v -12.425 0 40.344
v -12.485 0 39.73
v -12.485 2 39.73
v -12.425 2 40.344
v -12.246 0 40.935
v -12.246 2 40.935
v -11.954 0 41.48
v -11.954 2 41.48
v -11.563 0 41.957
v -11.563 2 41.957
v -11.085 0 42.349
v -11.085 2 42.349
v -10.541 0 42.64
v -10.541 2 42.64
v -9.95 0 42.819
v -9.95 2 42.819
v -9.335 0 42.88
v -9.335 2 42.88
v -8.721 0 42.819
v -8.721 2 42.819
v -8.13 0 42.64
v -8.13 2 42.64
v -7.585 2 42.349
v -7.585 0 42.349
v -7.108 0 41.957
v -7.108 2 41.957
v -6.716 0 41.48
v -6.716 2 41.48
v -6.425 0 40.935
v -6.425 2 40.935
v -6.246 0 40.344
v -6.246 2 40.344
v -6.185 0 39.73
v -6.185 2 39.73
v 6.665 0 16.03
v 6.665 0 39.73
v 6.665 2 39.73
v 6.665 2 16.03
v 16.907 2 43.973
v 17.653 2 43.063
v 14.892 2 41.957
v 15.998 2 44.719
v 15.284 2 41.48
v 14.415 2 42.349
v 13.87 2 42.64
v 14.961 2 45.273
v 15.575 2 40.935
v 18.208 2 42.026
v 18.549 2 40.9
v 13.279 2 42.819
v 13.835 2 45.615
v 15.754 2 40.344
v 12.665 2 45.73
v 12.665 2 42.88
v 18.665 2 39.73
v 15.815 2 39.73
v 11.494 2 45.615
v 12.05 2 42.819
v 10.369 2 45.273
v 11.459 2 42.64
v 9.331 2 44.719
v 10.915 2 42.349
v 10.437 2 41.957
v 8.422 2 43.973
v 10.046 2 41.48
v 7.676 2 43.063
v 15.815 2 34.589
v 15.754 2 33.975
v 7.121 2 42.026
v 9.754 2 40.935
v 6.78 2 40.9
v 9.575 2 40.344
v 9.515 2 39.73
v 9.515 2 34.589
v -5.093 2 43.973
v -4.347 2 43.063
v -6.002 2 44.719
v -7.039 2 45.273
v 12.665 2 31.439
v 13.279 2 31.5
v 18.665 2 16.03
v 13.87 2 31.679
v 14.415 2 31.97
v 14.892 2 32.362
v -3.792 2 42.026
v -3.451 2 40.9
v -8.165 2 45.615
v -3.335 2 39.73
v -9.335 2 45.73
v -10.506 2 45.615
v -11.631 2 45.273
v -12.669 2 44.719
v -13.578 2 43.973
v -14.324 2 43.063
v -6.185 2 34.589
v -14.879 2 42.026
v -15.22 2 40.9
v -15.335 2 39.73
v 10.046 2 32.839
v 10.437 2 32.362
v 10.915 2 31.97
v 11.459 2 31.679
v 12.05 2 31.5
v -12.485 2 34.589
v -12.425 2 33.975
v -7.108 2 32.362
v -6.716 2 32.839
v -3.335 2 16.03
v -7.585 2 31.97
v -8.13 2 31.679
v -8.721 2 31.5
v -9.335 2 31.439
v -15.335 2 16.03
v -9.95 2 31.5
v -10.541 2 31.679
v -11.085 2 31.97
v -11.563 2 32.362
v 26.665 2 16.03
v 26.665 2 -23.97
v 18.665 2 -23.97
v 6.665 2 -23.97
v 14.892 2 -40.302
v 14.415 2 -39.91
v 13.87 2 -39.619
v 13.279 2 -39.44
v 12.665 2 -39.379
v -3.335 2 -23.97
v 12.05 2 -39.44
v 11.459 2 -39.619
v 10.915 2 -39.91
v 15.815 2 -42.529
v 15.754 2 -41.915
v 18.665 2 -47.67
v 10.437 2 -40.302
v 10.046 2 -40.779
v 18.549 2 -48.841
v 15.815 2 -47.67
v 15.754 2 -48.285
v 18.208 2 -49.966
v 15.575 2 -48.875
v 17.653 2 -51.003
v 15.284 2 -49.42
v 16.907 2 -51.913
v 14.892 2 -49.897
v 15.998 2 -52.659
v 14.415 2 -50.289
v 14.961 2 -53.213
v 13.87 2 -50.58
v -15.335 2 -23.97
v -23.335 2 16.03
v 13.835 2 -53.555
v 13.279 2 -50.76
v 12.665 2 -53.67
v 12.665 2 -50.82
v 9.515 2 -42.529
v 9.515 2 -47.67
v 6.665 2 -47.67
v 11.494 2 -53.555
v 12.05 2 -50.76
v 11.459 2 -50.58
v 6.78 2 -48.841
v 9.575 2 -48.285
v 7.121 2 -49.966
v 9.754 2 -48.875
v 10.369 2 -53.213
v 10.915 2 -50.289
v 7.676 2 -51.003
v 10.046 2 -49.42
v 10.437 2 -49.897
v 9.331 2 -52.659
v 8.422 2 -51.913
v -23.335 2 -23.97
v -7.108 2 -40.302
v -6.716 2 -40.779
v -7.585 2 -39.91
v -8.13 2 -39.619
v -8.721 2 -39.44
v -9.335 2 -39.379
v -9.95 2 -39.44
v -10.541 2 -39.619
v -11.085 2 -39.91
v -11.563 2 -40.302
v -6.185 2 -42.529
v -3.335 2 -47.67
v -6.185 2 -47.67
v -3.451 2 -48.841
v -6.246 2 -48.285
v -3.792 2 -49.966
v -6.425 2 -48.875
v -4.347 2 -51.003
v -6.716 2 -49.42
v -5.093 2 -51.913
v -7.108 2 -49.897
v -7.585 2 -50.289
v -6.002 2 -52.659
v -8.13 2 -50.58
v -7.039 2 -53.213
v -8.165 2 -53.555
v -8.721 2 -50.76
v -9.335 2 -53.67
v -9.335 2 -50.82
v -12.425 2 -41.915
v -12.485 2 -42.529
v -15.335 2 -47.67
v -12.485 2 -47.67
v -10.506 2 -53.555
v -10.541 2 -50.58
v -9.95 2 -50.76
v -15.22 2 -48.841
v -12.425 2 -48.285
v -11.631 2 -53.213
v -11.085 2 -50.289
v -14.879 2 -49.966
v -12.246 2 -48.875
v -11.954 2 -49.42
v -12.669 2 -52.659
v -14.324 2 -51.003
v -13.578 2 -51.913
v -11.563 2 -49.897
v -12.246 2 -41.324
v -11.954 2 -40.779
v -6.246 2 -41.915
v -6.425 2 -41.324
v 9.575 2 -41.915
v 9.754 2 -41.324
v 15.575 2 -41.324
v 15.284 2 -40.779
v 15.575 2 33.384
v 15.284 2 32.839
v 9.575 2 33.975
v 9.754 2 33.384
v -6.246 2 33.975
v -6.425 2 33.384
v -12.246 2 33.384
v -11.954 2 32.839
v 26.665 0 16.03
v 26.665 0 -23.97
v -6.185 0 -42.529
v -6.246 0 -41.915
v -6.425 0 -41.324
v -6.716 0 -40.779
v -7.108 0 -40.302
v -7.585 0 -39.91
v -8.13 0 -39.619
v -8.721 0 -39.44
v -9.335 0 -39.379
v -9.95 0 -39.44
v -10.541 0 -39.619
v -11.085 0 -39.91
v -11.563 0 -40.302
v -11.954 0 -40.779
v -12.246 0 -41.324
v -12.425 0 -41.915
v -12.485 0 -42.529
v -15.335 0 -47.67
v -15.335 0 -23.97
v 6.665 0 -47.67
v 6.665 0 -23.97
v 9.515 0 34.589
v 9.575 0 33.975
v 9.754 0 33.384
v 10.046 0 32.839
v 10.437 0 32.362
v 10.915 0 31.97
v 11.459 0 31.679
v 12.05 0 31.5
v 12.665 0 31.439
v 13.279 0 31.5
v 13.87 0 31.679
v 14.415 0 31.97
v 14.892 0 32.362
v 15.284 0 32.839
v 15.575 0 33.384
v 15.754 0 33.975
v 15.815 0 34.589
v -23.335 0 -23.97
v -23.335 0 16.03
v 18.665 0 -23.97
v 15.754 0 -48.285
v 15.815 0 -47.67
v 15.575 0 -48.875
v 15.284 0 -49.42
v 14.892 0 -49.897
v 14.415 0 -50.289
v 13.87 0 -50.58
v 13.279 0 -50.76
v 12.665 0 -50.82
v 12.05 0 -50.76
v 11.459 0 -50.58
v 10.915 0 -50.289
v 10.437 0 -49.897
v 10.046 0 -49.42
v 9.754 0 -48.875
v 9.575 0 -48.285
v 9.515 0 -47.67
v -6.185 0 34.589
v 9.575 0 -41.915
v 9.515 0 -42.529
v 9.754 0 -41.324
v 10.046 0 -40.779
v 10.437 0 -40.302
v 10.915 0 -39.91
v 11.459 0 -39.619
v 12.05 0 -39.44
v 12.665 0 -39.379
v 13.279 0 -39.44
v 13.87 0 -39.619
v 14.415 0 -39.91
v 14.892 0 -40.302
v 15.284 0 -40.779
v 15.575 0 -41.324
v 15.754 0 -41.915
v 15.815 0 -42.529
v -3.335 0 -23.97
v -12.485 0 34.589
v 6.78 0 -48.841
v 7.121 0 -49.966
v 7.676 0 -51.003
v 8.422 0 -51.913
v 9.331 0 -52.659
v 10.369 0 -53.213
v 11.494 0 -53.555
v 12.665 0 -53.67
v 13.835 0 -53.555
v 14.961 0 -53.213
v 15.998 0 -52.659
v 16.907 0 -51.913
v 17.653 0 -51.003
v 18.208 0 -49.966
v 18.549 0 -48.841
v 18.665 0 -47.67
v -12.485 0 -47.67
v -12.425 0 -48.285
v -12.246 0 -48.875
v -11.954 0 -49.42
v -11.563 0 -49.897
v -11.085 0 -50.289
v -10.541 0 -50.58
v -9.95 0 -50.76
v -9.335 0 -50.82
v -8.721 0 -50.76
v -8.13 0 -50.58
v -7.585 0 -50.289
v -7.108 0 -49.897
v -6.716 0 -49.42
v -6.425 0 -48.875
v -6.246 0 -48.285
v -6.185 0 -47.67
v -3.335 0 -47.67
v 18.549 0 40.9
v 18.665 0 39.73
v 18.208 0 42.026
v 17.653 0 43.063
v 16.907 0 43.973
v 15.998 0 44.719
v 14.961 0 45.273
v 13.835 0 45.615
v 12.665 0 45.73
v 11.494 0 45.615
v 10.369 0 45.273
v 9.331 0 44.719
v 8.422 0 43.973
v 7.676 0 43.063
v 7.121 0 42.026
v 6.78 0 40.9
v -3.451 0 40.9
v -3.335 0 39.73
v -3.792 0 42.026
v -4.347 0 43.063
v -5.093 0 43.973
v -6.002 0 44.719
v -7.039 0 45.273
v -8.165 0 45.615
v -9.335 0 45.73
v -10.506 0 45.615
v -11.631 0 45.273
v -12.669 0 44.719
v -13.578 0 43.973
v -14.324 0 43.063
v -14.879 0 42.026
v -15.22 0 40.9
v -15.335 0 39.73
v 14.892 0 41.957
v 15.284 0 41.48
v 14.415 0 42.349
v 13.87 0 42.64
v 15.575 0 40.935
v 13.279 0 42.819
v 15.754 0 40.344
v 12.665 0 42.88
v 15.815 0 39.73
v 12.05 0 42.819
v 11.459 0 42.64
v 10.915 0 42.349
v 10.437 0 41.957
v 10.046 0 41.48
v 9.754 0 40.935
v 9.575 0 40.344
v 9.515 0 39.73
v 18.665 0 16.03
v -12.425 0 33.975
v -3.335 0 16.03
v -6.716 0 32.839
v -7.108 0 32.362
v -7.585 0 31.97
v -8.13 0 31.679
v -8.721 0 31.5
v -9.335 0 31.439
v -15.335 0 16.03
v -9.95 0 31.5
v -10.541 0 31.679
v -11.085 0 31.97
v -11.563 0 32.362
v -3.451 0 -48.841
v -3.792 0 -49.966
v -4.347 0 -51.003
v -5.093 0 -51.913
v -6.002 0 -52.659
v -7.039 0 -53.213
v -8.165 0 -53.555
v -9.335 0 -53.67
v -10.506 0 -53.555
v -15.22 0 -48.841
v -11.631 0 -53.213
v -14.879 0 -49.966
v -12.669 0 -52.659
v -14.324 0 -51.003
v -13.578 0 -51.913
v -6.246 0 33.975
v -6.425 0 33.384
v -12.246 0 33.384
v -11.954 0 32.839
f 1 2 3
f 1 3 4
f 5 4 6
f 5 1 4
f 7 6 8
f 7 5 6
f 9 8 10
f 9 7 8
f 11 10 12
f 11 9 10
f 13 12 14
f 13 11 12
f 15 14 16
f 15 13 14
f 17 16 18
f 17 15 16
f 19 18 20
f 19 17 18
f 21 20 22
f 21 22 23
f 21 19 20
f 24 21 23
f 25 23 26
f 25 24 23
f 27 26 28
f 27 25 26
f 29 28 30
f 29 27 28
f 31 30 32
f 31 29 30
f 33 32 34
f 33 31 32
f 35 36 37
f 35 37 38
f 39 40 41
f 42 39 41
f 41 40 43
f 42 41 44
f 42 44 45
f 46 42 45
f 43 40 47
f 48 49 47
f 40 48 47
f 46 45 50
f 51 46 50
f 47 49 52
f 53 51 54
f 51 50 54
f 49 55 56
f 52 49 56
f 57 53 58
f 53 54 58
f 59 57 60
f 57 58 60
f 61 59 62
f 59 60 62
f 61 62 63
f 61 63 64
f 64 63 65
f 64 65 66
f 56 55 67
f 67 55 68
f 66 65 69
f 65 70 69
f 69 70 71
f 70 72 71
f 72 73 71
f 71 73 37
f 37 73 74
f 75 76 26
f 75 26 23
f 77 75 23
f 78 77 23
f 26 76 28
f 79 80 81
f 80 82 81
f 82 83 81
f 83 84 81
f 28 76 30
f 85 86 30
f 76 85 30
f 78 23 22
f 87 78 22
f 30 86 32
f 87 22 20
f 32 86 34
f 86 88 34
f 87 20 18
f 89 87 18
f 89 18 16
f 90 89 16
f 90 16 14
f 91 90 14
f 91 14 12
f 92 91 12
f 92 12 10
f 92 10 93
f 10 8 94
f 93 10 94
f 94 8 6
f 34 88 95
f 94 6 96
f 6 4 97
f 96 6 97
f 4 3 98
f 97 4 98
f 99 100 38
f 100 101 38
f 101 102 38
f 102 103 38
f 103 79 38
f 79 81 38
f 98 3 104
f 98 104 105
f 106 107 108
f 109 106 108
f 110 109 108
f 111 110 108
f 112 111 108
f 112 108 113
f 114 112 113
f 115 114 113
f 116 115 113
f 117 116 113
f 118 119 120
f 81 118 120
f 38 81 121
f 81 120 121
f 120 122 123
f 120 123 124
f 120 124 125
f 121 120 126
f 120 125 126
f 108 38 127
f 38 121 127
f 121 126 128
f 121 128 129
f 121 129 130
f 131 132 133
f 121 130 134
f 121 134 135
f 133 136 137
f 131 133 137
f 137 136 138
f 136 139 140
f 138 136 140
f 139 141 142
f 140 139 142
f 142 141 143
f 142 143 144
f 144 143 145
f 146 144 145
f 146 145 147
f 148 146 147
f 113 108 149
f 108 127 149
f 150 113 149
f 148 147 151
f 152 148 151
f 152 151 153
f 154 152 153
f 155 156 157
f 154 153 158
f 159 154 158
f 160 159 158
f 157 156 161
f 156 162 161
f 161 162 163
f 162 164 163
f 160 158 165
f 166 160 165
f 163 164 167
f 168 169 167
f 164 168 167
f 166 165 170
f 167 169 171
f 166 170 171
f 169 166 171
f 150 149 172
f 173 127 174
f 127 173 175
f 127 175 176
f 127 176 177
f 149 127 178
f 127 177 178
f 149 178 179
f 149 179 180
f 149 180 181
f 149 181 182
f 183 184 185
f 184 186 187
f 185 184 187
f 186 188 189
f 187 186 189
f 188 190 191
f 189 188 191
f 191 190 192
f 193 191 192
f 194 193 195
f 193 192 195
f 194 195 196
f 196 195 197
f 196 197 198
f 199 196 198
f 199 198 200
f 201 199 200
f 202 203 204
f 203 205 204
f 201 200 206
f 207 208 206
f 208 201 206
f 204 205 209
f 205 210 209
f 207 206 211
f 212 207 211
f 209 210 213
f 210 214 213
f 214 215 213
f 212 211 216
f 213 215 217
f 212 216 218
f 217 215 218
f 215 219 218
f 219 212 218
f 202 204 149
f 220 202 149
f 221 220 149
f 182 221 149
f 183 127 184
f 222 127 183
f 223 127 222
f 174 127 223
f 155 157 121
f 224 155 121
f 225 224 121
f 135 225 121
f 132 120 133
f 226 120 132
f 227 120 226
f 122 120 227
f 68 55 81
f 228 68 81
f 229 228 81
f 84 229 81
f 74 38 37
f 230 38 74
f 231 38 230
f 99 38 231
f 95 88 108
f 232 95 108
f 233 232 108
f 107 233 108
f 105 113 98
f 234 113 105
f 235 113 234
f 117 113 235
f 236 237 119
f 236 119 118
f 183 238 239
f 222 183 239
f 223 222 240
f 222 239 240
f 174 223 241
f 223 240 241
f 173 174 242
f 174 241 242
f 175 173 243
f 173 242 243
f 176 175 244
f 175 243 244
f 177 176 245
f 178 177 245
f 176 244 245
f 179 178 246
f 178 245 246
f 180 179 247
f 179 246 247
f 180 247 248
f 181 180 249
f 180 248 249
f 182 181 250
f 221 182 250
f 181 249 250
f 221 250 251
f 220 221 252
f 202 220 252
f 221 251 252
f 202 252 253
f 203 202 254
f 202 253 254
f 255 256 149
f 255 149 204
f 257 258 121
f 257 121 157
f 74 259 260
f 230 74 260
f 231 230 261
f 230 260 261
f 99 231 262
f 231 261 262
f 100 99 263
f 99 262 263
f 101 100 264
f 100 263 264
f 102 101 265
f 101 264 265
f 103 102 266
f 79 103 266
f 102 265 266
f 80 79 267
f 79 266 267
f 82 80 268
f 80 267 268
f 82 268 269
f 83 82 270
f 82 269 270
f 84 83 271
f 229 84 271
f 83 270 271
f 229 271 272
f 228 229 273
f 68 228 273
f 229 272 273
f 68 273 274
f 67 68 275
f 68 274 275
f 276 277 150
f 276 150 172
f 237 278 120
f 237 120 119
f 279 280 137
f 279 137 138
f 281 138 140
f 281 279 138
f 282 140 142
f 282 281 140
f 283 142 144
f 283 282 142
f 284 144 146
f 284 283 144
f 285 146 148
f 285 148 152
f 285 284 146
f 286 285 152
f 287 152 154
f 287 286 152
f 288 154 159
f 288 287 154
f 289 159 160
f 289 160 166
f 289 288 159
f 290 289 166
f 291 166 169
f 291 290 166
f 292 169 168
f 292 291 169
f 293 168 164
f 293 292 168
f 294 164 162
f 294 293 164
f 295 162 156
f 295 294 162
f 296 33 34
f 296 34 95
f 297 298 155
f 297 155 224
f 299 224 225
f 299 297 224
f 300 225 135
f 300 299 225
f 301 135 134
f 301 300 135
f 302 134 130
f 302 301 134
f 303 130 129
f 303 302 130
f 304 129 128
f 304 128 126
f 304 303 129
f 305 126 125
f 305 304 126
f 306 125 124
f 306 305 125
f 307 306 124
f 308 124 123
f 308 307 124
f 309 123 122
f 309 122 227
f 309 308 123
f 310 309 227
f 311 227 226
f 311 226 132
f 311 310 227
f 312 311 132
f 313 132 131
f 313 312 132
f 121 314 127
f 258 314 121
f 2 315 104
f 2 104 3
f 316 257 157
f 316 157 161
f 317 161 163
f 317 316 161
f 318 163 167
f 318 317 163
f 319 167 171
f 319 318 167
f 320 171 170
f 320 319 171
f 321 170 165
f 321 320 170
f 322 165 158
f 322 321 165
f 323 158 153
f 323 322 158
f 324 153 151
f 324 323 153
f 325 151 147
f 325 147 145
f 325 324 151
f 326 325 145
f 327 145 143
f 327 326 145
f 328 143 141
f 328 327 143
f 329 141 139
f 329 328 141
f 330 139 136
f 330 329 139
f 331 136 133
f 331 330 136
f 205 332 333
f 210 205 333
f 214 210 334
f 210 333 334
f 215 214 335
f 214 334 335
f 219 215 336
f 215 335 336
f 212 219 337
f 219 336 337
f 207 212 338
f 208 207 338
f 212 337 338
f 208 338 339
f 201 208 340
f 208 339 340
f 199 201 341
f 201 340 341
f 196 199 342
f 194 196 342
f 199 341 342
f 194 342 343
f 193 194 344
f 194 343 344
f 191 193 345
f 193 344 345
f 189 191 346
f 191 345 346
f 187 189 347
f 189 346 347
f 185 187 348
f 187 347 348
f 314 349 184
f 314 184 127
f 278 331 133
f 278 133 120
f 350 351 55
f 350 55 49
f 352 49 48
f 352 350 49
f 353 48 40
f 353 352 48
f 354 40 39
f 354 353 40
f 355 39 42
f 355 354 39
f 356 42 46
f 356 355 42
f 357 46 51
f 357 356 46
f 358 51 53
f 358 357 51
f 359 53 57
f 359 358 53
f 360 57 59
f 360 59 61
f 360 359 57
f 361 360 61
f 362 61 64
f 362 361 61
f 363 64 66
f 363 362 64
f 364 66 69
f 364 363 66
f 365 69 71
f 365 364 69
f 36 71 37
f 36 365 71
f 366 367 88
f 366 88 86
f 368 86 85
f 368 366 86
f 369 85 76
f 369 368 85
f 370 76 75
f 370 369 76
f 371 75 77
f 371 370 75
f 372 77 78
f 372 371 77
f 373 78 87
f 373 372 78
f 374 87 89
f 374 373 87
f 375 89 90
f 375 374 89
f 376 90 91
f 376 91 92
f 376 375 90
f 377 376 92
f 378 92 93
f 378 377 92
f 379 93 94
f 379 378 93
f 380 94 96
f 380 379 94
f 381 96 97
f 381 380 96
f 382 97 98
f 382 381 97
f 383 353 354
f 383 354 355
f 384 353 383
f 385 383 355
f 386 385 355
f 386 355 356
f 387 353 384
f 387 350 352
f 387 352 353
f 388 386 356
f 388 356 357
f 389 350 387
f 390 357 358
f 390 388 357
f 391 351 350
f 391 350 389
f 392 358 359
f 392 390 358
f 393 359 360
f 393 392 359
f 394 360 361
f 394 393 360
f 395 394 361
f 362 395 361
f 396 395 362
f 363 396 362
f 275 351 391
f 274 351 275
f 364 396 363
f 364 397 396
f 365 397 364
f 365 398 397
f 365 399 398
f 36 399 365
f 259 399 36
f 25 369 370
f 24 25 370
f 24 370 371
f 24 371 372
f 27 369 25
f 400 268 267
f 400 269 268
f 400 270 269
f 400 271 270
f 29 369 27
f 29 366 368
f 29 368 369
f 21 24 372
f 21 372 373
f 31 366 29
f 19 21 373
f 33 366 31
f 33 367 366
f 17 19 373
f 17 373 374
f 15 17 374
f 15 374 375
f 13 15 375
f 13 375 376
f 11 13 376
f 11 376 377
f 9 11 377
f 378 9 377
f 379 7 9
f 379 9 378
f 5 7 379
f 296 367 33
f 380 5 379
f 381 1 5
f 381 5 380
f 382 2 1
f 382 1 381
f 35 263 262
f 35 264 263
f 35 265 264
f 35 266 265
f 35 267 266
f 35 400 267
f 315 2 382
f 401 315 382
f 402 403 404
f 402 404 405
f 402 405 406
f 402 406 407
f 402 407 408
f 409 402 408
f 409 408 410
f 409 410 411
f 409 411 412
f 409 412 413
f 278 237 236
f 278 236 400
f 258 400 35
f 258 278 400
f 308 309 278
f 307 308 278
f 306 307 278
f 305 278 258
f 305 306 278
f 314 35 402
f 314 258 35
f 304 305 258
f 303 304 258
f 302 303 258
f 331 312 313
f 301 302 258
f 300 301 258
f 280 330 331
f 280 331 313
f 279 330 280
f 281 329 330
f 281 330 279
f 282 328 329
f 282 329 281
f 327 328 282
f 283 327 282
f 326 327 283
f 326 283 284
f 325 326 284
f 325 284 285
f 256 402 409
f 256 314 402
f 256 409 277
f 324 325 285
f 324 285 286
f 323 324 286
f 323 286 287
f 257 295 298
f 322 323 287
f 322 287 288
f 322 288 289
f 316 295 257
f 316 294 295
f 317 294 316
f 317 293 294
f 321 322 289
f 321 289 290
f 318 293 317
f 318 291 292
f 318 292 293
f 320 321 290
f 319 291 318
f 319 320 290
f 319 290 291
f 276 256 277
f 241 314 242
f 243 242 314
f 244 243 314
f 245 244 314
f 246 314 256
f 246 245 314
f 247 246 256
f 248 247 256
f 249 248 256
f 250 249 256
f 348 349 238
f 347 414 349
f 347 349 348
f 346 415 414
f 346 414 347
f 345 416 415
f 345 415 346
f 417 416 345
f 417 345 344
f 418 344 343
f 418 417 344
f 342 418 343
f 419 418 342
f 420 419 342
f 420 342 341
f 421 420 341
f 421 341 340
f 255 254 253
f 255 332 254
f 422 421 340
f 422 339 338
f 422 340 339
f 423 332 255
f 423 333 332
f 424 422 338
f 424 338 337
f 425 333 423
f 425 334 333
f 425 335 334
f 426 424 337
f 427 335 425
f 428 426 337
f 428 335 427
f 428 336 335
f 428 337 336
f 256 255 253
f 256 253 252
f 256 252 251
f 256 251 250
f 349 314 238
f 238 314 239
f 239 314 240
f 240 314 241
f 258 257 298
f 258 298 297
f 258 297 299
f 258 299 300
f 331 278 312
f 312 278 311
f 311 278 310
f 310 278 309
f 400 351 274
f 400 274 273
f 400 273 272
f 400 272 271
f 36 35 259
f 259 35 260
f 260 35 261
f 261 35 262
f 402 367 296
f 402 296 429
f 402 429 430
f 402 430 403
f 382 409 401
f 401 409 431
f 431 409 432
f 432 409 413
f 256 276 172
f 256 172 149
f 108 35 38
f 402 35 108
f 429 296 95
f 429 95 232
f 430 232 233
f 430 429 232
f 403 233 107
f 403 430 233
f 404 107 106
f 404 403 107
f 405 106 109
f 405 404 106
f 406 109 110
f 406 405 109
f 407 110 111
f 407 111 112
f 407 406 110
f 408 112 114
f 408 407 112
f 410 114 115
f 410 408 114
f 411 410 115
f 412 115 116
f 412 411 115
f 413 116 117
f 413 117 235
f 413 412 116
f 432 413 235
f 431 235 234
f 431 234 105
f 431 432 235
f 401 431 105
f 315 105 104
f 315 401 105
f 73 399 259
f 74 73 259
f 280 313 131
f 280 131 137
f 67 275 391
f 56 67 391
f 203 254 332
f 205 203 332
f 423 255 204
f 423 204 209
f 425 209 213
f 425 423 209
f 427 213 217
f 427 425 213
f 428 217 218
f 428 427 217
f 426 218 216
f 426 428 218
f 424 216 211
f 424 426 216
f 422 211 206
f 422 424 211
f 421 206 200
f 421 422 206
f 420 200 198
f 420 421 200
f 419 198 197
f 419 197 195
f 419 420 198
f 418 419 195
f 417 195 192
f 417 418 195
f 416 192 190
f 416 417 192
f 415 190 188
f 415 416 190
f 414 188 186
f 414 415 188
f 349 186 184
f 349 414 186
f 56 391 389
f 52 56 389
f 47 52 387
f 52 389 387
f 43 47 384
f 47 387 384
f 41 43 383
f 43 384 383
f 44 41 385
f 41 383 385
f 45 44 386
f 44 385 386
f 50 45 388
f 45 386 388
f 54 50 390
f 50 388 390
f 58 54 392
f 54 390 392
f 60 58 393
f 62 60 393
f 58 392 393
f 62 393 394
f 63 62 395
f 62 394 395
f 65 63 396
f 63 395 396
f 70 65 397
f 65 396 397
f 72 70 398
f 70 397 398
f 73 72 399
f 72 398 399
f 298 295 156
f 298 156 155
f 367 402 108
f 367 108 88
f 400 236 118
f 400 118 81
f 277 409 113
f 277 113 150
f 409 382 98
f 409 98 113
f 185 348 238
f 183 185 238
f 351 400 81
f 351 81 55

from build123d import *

# Parameters (mm, degrees)
BOSS_EXTRUDE1_DEPTH = 2


with BuildPart() as part:
    # Sketch1 → Boss-Extrude1 (new body)
    with BuildSketch(Plane(origin=(0, 0, 0), x_dir=(1, 0, 0), z_dir=(0, 1, 0))):
        with BuildLine():
            Line((-23.335340856, 23.970044555), (-15.335340856, 23.970044555))
            Line((-15.335340856, 23.970044555), (-15.335340856, 47.670044555))
            ThreePointArc((-15.335340856, 47.670044555), (-9.335340856, 53.670044555), (-3.335340856, 47.670044555))
            Line((-3.335340856, 47.670044555), (-3.335340856, 23.970044555))
            Line((-3.335340856, 23.970044555), (6.664659144, 23.970044555))
            Line((6.664659144, 23.970044555), (6.664659144, 47.670044555))
            ThreePointArc((6.664659144, 47.670044555), (12.664659144, 53.670044555), (18.664659144, 47.670044555))
            Line((18.664659144, 47.670044555), (18.664659144, 23.970044555))
            Line((18.664659144, 23.970044555), (26.664659144, 23.970044555))
            Line((26.664659144, 23.970044555), (26.664659144, -16.029955445))
            Line((26.664659144, -16.029955445), (18.664659144, -16.029955445))
            Line((18.664659144, -16.029955445), (18.664659144, -39.729955445))
            ThreePointArc((18.664659144, -39.729955445), (12.664659144, -45.729955445), (6.664659144, -39.729955445))
            Line((6.664659144, -39.729955445), (6.664659144, -16.029955445))
            Line((6.664659144, -16.029955445), (-3.335340856, -16.029955445))
            Line((-3.335340856, -16.029955445), (-3.335340856, -39.729955445))
            ThreePointArc((-3.335340856, -39.729955445), (-9.335340856, -45.729955445), (-15.335340856, -39.729955445))
            Line((-15.335340856, -39.729955445), (-15.335340856, -16.029955445))
            Line((-15.335340856, -16.029955445), (-23.335340856, -16.029955445))
            Line((-23.335340856, -16.029955445), (-23.335340856, 23.970044555))
        make_face()
        with BuildLine():
            Line((9.514659144, 47.670044555), (9.514659144, 42.529492266))
            ThreePointArc((9.514659144, 42.529492266), (12.664659144, 39.379492266), (15.814659144, 42.529492266))
            Line((15.814659144, 42.529492266), (15.814659144, 47.670044555))
            ThreePointArc((15.814659144, 47.670044555), (12.664659144, 50.820044555), (9.514659144, 47.670044555))
        make_face(mode=Mode.SUBTRACT)
        with BuildLine():
            Line((-6.185340856, 47.670044555), (-6.185340856, 42.529492266))
            ThreePointArc((-6.185340856, 42.529492266), (-9.335340856, 39.379492266), (-12.485340856, 42.529492266))
            Line((-12.485340856, 42.529492266), (-12.485340856, 47.670044555))
            ThreePointArc((-12.485340856, 47.670044555), (-9.335340856, 50.820044555), (-6.185340856, 47.670044555))
        make_face(mode=Mode.SUBTRACT)
        with BuildLine():
            Line((9.514659144, -39.729955445), (9.514659144, -34.589403157))
            ThreePointArc((9.514659144, -34.589403157), (12.664659144, -31.439403157), (15.814659144, -34.589403157))
            Line((15.814659144, -34.589403157), (15.814659144, -39.729955445))
            ThreePointArc((15.814659144, -39.729955445), (12.664659144, -42.879955445), (9.514659144, -39.729955445))
        make_face(mode=Mode.SUBTRACT)
        with BuildLine():
            Line((-6.185340856, -39.729955445), (-6.185340856, -34.589403157))
            ThreePointArc((-6.185340856, -34.589403157), (-9.335340856, -31.439403157), (-12.485340856, -34.589403157))
            Line((-12.485340856, -34.589403157), (-12.485340856, -39.729955445))
            ThreePointArc((-12.485340856, -39.729955445), (-9.335340856, -42.879955445), (-6.185340856, -39.729955445))
        make_face(mode=Mode.SUBTRACT)
    extrude(amount=BOSS_EXTRUDE1_DEPTH)


solid = part.part
